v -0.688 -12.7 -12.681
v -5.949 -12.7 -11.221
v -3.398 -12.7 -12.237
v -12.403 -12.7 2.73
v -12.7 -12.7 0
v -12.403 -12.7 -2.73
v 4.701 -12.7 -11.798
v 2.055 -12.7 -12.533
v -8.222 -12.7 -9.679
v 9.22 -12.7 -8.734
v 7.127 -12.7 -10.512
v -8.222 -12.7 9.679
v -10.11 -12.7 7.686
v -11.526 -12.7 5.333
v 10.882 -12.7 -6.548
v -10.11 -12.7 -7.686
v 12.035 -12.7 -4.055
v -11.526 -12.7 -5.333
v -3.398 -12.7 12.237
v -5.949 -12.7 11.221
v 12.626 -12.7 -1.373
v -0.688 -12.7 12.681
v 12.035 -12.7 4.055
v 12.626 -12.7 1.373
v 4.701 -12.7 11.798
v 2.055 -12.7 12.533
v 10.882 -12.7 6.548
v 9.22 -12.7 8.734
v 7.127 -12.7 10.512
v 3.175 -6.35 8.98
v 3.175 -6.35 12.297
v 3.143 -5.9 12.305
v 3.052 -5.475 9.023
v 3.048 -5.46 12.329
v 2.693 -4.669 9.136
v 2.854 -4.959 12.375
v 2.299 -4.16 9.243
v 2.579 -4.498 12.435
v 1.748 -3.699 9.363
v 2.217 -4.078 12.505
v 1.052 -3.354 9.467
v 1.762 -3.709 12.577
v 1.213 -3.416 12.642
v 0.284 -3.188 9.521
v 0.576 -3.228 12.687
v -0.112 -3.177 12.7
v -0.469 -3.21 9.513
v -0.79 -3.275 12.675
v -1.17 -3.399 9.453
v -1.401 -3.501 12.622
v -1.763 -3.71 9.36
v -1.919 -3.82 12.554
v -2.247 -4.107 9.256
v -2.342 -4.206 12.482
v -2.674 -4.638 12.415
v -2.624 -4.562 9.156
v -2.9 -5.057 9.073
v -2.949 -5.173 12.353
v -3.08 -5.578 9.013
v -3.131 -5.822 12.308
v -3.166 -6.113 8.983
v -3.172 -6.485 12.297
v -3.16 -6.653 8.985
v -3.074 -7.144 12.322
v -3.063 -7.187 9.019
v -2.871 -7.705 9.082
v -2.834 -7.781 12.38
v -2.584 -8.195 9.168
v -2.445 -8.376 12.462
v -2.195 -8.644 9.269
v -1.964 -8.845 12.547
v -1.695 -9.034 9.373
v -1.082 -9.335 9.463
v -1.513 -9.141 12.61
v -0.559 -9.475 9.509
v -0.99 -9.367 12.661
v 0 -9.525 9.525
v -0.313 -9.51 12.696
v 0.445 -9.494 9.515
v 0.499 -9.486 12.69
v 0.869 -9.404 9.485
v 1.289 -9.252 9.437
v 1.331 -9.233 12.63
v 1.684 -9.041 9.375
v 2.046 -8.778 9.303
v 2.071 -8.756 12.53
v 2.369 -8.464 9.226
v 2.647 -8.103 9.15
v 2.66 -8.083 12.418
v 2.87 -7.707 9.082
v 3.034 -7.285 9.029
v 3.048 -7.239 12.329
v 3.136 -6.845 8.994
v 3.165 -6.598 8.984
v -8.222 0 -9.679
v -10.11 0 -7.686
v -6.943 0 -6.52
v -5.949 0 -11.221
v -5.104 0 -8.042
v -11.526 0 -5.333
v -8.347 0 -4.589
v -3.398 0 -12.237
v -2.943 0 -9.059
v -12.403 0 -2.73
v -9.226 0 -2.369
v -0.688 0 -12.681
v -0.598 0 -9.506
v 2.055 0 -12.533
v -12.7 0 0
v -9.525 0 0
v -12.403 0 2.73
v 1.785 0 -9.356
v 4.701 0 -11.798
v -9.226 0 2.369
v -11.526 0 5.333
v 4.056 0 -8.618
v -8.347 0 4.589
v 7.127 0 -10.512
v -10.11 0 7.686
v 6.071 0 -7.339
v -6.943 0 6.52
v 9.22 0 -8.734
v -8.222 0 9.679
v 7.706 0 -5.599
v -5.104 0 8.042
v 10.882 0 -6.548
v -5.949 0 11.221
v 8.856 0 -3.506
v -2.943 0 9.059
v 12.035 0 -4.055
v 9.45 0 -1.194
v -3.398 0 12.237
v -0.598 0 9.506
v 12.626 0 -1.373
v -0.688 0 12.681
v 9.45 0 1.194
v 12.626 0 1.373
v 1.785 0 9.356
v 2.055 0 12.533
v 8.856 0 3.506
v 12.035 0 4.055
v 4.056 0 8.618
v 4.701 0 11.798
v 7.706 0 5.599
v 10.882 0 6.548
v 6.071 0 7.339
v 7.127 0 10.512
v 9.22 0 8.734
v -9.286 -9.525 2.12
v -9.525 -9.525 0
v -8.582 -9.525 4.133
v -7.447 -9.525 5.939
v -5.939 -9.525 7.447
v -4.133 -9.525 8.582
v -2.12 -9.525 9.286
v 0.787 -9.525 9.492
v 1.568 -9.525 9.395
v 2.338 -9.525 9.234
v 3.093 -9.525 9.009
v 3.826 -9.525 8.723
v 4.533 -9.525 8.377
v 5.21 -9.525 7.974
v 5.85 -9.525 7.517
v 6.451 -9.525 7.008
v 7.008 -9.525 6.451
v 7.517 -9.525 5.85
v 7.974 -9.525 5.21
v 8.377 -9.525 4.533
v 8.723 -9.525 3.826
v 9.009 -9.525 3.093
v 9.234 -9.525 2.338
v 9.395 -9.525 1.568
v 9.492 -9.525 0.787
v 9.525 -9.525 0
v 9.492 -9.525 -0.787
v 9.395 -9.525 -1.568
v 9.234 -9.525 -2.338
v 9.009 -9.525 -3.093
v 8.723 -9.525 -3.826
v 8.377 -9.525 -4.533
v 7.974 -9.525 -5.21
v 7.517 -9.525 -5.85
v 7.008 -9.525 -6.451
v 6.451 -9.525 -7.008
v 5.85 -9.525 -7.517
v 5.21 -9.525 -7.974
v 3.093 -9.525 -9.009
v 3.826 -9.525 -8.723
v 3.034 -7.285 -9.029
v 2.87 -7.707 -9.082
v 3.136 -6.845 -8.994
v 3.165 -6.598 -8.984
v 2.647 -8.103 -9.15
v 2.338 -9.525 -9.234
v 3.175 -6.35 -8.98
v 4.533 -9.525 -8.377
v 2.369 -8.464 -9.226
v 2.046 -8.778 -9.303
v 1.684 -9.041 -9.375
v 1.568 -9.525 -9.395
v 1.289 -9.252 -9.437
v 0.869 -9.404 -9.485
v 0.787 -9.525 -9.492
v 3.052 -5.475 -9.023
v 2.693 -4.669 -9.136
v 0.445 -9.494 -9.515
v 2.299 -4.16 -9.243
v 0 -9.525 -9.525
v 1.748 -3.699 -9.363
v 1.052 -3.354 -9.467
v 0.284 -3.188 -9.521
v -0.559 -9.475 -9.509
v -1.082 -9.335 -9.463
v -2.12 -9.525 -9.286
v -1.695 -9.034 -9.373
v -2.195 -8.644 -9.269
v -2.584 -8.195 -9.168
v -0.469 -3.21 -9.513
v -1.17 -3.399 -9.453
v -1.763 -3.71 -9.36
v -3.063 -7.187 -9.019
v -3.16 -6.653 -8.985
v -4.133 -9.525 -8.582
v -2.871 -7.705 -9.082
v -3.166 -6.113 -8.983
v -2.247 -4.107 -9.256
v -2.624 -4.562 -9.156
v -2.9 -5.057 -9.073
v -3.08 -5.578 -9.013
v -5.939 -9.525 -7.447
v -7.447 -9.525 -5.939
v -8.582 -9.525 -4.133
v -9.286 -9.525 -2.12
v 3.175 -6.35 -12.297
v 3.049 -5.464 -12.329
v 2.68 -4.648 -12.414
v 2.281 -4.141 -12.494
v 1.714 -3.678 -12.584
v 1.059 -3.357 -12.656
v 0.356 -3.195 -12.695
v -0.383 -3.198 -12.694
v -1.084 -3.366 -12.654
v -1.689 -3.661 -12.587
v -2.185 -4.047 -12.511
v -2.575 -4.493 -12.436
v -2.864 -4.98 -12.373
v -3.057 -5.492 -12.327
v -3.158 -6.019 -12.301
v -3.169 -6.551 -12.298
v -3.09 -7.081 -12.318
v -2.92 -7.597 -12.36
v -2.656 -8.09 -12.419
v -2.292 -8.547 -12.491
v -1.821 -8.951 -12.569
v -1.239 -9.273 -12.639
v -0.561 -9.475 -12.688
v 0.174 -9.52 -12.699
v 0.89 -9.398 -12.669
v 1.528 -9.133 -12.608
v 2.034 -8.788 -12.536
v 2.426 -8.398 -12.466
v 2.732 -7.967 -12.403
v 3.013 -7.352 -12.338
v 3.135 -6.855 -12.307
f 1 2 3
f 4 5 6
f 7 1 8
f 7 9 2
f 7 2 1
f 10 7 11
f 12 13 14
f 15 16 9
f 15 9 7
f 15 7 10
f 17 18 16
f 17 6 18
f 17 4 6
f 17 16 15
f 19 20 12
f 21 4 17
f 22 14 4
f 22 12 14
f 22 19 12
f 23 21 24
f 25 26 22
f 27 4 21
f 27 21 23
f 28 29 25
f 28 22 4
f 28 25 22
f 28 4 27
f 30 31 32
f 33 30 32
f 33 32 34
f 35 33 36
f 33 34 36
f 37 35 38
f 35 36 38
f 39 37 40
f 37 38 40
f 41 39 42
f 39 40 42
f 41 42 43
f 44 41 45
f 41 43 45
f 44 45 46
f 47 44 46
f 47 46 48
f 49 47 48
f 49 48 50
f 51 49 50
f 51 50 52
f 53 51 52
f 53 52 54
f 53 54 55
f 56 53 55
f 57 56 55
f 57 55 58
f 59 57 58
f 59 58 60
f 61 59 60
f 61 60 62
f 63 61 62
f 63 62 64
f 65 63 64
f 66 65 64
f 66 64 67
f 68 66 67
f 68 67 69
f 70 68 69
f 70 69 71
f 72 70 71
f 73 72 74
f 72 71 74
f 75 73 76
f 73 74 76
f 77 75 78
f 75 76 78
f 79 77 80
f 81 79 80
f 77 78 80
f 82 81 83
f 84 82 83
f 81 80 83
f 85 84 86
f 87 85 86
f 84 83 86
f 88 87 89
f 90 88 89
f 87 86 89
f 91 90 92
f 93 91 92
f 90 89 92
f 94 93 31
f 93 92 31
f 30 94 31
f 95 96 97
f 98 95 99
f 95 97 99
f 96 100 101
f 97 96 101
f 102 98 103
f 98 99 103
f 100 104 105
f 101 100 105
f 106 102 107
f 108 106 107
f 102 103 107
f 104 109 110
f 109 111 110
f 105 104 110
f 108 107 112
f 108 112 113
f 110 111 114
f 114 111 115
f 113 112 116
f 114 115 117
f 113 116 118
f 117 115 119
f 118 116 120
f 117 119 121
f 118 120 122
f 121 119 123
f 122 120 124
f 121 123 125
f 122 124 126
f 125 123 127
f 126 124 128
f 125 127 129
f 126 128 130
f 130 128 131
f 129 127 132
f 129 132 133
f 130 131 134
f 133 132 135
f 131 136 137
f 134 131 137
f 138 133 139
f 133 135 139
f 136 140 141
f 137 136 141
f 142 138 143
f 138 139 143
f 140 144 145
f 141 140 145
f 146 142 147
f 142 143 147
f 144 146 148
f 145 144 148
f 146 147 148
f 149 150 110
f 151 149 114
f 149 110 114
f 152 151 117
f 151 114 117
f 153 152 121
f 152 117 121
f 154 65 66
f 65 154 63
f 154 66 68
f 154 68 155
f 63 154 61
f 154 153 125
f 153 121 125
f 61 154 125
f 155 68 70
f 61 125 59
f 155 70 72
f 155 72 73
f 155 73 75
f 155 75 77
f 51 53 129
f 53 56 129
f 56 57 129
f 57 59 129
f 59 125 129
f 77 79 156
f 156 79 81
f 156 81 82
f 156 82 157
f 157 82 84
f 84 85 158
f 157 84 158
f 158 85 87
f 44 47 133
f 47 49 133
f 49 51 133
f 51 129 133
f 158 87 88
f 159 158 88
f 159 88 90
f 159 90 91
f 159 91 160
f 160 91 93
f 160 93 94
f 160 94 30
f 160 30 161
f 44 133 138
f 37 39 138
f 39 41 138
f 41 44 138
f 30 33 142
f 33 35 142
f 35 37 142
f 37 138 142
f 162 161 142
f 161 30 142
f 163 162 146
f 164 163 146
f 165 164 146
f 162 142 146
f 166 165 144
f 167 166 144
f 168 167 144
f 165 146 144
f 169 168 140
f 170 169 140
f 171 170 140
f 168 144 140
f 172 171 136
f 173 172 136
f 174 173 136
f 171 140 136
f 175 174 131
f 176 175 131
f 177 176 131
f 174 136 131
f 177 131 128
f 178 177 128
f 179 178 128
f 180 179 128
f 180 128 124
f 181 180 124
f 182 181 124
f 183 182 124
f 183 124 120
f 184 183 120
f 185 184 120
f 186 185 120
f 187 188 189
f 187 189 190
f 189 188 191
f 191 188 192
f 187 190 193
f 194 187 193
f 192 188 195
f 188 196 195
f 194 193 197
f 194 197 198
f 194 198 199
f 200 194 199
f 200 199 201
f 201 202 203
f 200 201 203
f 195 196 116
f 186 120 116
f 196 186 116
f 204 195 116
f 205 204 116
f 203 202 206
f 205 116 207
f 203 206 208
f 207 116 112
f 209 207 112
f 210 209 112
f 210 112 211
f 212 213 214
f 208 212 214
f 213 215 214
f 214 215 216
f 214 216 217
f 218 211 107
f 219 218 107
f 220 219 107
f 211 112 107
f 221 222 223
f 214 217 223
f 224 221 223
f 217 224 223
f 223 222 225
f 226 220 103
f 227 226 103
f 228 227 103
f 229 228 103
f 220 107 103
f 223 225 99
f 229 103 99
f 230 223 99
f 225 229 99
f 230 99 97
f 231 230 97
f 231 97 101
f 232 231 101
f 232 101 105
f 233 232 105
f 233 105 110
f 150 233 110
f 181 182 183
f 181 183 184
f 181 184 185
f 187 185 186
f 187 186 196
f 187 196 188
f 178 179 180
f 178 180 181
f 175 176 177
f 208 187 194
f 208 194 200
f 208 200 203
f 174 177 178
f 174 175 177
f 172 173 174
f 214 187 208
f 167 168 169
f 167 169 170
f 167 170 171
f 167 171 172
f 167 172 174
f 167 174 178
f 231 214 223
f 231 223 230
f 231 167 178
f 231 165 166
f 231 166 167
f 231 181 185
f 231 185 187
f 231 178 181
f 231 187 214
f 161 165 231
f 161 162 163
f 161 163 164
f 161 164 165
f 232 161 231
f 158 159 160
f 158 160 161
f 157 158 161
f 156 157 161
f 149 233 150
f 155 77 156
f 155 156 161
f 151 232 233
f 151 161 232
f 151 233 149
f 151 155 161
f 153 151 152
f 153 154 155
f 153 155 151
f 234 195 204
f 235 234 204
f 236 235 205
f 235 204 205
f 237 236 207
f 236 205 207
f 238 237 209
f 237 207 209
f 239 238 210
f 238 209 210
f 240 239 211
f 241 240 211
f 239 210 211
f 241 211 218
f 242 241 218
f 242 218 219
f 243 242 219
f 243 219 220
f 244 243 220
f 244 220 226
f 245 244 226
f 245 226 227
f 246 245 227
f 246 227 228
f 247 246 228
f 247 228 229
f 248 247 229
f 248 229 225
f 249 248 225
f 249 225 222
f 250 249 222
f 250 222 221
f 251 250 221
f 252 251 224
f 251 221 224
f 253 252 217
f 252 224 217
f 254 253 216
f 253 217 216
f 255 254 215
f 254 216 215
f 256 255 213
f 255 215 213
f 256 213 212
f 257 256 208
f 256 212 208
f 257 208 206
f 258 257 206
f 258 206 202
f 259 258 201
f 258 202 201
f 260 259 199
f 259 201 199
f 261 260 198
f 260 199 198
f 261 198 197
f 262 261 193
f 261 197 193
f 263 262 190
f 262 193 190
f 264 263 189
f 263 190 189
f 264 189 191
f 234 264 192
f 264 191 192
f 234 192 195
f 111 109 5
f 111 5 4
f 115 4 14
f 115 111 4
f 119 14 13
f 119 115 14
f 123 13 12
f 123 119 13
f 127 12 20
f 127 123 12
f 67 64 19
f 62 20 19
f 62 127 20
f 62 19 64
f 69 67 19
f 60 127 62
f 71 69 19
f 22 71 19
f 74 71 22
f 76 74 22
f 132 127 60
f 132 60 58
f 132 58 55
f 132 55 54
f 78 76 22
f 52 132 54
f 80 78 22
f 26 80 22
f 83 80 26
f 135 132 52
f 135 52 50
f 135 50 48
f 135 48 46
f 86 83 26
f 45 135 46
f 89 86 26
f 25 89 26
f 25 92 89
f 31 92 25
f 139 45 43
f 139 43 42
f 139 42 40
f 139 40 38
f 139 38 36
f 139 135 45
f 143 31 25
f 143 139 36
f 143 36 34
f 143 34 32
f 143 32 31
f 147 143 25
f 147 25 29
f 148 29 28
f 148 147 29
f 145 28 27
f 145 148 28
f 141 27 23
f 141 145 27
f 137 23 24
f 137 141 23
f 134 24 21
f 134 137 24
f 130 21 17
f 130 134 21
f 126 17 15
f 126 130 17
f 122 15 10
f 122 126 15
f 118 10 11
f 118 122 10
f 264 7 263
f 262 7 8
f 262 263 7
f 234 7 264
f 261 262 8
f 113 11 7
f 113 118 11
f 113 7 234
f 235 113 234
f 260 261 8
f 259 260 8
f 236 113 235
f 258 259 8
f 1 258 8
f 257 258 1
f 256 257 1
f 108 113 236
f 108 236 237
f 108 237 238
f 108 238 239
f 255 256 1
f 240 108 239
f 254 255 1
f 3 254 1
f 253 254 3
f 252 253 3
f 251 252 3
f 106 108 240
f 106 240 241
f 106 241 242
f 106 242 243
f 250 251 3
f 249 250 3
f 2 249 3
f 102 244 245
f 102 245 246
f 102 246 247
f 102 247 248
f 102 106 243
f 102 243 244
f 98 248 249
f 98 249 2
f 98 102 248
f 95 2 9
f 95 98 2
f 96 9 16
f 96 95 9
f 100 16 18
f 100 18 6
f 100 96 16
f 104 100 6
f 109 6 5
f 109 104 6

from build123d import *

# Parameters (mm, degrees)
F0_W     = 25.4
F0_H     = 25.4
F1_DEPTH = 12.7
F2_R     = 3.175
F3_DEPTH = 25.4
F4_R     = 12.7
F5_DEPTH = 25.4
F6_R     = 9.525
F7_DEPTH = 9.525


with BuildPart() as f1:
    # F0 (on Front) → F1 (new body)
    with BuildSketch(Plane.XZ):
        Rectangle(F0_W, F0_H)
    extrude(amount=F1_DEPTH)

    # F2 (on face) → F3 (cut)
    with BuildSketch(Plane.XY.offset(12.7)):
        with Locations((0, -6.35)):
            Circle(F2_R)
    extrude(amount=-F3_DEPTH, mode=Mode.SUBTRACT)

    # F4 (on face) → F5 (intersect)
    with BuildSketch(Plane(origin=(0, 0, 0), x_dir=(-1, 0, 0), z_dir=(0, 1, 0))):
        Circle(F4_R)
    extrude(amount=-F5_DEPTH, mode=Mode.INTERSECT)

    # F6 (on face) → F7 (cut)
    with BuildSketch(Plane(origin=(0, 0, 0), x_dir=(-1, 0, 0), z_dir=(0, 1, 0))):
        Circle(F6_R)
    extrude(amount=-F7_DEPTH, mode=Mode.SUBTRACT)


solid = f1.part
